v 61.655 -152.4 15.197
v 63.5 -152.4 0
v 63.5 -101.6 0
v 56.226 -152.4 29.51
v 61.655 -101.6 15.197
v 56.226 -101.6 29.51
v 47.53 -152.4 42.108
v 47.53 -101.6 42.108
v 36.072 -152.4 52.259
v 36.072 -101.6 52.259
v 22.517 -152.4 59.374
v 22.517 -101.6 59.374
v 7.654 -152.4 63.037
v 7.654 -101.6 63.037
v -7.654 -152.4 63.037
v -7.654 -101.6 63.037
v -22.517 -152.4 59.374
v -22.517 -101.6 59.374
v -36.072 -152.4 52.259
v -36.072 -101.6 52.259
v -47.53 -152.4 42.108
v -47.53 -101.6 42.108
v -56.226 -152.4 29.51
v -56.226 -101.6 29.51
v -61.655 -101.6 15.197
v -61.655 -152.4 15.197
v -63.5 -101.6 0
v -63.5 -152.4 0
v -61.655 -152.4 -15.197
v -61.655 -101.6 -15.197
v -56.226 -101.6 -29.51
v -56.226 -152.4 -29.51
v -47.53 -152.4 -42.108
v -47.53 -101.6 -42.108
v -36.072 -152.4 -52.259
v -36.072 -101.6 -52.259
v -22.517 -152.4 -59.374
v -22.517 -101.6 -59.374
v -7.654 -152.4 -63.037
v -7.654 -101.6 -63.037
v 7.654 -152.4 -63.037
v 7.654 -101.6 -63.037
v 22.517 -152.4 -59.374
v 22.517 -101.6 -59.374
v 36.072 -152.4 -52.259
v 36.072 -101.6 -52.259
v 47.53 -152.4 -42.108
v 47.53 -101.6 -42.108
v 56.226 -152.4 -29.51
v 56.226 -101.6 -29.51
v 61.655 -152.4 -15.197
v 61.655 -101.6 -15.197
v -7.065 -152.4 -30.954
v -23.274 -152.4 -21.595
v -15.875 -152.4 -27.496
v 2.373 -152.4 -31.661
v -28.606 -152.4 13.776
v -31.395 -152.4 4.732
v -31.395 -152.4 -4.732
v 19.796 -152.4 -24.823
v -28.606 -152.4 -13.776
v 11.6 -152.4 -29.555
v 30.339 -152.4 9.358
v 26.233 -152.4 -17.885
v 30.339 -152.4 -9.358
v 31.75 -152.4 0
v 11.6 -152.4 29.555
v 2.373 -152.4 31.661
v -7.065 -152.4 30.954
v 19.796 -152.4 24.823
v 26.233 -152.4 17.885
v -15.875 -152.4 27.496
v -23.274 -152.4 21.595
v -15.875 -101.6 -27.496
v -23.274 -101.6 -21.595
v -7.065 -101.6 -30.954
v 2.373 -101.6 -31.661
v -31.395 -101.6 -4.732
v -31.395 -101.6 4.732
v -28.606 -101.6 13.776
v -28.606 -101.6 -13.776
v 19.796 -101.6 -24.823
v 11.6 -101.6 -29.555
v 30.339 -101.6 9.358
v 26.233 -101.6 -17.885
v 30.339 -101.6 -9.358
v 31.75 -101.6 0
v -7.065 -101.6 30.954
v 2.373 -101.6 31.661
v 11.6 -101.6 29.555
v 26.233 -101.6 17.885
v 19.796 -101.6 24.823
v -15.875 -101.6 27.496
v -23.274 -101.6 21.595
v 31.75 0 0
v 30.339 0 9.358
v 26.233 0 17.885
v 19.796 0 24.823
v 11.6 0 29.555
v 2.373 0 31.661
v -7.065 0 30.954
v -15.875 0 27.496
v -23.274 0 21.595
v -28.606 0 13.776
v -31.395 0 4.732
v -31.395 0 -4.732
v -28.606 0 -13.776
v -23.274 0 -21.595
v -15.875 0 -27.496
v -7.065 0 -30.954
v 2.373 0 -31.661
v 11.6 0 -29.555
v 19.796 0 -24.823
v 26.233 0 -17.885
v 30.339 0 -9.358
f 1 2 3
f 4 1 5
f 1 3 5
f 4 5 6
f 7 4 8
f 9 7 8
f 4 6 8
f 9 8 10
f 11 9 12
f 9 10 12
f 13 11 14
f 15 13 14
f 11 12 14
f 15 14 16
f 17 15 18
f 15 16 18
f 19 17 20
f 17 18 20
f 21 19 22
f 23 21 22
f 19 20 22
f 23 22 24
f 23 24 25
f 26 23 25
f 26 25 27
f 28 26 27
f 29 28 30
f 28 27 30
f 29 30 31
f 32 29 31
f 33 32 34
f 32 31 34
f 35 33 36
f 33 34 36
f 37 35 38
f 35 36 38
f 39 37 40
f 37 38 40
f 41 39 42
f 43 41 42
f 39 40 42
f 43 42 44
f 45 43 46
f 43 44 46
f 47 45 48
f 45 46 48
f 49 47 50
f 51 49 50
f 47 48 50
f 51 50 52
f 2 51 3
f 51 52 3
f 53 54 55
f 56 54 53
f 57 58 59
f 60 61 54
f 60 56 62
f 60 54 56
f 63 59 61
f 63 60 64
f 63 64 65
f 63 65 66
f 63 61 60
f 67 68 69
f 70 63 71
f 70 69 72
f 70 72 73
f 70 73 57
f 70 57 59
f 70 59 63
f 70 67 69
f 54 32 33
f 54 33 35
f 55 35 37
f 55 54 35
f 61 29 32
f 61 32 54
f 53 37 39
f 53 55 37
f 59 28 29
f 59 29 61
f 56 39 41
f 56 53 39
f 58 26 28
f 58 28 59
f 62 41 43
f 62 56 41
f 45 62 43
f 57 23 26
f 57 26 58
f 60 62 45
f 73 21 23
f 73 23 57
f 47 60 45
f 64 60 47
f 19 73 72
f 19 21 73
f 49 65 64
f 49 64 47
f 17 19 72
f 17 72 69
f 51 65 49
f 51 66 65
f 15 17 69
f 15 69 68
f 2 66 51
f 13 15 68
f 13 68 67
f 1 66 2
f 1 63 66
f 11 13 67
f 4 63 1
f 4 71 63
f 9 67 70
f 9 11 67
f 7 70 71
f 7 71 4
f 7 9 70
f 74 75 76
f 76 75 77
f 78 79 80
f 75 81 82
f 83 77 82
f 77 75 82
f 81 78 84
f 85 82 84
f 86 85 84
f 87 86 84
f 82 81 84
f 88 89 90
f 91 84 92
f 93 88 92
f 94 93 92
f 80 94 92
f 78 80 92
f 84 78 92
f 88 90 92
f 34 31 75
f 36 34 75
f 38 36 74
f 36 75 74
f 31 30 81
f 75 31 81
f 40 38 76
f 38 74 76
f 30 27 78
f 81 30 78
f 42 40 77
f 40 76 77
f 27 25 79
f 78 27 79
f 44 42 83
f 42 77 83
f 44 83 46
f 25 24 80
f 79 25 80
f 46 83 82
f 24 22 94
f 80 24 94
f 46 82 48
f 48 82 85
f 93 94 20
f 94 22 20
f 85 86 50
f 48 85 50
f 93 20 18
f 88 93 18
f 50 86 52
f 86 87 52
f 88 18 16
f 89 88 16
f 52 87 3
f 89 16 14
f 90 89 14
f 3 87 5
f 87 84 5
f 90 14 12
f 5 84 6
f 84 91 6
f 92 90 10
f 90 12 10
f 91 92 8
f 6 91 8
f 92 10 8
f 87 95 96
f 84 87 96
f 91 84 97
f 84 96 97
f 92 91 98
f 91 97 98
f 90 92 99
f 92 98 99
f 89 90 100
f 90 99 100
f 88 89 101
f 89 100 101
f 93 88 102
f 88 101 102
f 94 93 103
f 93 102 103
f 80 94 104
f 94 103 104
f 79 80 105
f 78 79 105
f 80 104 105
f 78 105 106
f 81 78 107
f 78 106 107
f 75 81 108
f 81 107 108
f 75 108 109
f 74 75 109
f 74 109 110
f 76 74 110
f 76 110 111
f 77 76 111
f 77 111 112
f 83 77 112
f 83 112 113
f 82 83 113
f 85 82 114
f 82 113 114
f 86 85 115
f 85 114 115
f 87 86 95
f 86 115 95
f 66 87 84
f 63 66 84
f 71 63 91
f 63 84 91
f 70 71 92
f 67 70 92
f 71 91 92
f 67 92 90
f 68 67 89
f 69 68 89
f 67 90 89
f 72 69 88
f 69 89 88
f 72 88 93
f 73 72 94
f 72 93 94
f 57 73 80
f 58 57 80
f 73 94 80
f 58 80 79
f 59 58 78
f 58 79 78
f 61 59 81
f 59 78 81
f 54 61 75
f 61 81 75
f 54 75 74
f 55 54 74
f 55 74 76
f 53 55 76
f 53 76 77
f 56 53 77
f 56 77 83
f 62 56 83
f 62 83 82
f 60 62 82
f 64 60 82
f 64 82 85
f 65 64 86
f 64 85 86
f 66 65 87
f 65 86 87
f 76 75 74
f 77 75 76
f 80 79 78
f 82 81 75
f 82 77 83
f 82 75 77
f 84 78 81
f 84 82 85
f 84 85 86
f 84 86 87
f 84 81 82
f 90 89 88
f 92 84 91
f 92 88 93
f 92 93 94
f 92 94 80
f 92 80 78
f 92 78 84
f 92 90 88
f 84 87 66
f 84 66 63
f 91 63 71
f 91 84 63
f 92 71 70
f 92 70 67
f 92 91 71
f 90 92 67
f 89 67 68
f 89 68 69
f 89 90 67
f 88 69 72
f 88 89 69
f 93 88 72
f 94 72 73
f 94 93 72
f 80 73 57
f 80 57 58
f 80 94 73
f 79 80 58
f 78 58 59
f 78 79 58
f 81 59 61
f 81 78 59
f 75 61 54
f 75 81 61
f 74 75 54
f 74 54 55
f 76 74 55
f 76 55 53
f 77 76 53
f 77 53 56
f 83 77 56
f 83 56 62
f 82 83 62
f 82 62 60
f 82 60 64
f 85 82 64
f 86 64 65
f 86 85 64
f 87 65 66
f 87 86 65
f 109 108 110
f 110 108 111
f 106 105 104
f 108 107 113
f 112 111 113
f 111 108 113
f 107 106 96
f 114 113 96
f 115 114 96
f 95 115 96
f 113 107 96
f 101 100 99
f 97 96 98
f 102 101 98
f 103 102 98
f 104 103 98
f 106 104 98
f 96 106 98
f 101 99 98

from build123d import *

# Parameters (mm, degrees)
F0_R      = 31.75
F1_DEPTH  = 101.6
F2_R      = 63.5
F2_R_2    = 31.75
F3_DEPTH  = 50.8
F1_FACE_R = 31.75
F4_DEPTH  = 50.8


with BuildPart() as f1:
    # F0 (on Front) → F1 (new body)
    with BuildSketch(Plane.XZ):
        Circle(F0_R)
    extrude(amount=F1_DEPTH)


with BuildPart() as f3:
    # F2 (on face) → F3 (new body)
    with BuildSketch(Plane.XZ.offset(101.6)):
        Circle(F2_R)
        Circle(F2_R_2, mode=Mode.SUBTRACT)
    extrude(amount=F3_DEPTH)


with BuildPart() as f4:
    # F1_face (on face) → F4 (new body)
    with BuildSketch(Plane.XZ.offset(101.6)):
        Circle(F1_FACE_R)
    extrude(amount=F4_DEPTH)


solid = Compound([f1.part, f3.part, f4.part])
